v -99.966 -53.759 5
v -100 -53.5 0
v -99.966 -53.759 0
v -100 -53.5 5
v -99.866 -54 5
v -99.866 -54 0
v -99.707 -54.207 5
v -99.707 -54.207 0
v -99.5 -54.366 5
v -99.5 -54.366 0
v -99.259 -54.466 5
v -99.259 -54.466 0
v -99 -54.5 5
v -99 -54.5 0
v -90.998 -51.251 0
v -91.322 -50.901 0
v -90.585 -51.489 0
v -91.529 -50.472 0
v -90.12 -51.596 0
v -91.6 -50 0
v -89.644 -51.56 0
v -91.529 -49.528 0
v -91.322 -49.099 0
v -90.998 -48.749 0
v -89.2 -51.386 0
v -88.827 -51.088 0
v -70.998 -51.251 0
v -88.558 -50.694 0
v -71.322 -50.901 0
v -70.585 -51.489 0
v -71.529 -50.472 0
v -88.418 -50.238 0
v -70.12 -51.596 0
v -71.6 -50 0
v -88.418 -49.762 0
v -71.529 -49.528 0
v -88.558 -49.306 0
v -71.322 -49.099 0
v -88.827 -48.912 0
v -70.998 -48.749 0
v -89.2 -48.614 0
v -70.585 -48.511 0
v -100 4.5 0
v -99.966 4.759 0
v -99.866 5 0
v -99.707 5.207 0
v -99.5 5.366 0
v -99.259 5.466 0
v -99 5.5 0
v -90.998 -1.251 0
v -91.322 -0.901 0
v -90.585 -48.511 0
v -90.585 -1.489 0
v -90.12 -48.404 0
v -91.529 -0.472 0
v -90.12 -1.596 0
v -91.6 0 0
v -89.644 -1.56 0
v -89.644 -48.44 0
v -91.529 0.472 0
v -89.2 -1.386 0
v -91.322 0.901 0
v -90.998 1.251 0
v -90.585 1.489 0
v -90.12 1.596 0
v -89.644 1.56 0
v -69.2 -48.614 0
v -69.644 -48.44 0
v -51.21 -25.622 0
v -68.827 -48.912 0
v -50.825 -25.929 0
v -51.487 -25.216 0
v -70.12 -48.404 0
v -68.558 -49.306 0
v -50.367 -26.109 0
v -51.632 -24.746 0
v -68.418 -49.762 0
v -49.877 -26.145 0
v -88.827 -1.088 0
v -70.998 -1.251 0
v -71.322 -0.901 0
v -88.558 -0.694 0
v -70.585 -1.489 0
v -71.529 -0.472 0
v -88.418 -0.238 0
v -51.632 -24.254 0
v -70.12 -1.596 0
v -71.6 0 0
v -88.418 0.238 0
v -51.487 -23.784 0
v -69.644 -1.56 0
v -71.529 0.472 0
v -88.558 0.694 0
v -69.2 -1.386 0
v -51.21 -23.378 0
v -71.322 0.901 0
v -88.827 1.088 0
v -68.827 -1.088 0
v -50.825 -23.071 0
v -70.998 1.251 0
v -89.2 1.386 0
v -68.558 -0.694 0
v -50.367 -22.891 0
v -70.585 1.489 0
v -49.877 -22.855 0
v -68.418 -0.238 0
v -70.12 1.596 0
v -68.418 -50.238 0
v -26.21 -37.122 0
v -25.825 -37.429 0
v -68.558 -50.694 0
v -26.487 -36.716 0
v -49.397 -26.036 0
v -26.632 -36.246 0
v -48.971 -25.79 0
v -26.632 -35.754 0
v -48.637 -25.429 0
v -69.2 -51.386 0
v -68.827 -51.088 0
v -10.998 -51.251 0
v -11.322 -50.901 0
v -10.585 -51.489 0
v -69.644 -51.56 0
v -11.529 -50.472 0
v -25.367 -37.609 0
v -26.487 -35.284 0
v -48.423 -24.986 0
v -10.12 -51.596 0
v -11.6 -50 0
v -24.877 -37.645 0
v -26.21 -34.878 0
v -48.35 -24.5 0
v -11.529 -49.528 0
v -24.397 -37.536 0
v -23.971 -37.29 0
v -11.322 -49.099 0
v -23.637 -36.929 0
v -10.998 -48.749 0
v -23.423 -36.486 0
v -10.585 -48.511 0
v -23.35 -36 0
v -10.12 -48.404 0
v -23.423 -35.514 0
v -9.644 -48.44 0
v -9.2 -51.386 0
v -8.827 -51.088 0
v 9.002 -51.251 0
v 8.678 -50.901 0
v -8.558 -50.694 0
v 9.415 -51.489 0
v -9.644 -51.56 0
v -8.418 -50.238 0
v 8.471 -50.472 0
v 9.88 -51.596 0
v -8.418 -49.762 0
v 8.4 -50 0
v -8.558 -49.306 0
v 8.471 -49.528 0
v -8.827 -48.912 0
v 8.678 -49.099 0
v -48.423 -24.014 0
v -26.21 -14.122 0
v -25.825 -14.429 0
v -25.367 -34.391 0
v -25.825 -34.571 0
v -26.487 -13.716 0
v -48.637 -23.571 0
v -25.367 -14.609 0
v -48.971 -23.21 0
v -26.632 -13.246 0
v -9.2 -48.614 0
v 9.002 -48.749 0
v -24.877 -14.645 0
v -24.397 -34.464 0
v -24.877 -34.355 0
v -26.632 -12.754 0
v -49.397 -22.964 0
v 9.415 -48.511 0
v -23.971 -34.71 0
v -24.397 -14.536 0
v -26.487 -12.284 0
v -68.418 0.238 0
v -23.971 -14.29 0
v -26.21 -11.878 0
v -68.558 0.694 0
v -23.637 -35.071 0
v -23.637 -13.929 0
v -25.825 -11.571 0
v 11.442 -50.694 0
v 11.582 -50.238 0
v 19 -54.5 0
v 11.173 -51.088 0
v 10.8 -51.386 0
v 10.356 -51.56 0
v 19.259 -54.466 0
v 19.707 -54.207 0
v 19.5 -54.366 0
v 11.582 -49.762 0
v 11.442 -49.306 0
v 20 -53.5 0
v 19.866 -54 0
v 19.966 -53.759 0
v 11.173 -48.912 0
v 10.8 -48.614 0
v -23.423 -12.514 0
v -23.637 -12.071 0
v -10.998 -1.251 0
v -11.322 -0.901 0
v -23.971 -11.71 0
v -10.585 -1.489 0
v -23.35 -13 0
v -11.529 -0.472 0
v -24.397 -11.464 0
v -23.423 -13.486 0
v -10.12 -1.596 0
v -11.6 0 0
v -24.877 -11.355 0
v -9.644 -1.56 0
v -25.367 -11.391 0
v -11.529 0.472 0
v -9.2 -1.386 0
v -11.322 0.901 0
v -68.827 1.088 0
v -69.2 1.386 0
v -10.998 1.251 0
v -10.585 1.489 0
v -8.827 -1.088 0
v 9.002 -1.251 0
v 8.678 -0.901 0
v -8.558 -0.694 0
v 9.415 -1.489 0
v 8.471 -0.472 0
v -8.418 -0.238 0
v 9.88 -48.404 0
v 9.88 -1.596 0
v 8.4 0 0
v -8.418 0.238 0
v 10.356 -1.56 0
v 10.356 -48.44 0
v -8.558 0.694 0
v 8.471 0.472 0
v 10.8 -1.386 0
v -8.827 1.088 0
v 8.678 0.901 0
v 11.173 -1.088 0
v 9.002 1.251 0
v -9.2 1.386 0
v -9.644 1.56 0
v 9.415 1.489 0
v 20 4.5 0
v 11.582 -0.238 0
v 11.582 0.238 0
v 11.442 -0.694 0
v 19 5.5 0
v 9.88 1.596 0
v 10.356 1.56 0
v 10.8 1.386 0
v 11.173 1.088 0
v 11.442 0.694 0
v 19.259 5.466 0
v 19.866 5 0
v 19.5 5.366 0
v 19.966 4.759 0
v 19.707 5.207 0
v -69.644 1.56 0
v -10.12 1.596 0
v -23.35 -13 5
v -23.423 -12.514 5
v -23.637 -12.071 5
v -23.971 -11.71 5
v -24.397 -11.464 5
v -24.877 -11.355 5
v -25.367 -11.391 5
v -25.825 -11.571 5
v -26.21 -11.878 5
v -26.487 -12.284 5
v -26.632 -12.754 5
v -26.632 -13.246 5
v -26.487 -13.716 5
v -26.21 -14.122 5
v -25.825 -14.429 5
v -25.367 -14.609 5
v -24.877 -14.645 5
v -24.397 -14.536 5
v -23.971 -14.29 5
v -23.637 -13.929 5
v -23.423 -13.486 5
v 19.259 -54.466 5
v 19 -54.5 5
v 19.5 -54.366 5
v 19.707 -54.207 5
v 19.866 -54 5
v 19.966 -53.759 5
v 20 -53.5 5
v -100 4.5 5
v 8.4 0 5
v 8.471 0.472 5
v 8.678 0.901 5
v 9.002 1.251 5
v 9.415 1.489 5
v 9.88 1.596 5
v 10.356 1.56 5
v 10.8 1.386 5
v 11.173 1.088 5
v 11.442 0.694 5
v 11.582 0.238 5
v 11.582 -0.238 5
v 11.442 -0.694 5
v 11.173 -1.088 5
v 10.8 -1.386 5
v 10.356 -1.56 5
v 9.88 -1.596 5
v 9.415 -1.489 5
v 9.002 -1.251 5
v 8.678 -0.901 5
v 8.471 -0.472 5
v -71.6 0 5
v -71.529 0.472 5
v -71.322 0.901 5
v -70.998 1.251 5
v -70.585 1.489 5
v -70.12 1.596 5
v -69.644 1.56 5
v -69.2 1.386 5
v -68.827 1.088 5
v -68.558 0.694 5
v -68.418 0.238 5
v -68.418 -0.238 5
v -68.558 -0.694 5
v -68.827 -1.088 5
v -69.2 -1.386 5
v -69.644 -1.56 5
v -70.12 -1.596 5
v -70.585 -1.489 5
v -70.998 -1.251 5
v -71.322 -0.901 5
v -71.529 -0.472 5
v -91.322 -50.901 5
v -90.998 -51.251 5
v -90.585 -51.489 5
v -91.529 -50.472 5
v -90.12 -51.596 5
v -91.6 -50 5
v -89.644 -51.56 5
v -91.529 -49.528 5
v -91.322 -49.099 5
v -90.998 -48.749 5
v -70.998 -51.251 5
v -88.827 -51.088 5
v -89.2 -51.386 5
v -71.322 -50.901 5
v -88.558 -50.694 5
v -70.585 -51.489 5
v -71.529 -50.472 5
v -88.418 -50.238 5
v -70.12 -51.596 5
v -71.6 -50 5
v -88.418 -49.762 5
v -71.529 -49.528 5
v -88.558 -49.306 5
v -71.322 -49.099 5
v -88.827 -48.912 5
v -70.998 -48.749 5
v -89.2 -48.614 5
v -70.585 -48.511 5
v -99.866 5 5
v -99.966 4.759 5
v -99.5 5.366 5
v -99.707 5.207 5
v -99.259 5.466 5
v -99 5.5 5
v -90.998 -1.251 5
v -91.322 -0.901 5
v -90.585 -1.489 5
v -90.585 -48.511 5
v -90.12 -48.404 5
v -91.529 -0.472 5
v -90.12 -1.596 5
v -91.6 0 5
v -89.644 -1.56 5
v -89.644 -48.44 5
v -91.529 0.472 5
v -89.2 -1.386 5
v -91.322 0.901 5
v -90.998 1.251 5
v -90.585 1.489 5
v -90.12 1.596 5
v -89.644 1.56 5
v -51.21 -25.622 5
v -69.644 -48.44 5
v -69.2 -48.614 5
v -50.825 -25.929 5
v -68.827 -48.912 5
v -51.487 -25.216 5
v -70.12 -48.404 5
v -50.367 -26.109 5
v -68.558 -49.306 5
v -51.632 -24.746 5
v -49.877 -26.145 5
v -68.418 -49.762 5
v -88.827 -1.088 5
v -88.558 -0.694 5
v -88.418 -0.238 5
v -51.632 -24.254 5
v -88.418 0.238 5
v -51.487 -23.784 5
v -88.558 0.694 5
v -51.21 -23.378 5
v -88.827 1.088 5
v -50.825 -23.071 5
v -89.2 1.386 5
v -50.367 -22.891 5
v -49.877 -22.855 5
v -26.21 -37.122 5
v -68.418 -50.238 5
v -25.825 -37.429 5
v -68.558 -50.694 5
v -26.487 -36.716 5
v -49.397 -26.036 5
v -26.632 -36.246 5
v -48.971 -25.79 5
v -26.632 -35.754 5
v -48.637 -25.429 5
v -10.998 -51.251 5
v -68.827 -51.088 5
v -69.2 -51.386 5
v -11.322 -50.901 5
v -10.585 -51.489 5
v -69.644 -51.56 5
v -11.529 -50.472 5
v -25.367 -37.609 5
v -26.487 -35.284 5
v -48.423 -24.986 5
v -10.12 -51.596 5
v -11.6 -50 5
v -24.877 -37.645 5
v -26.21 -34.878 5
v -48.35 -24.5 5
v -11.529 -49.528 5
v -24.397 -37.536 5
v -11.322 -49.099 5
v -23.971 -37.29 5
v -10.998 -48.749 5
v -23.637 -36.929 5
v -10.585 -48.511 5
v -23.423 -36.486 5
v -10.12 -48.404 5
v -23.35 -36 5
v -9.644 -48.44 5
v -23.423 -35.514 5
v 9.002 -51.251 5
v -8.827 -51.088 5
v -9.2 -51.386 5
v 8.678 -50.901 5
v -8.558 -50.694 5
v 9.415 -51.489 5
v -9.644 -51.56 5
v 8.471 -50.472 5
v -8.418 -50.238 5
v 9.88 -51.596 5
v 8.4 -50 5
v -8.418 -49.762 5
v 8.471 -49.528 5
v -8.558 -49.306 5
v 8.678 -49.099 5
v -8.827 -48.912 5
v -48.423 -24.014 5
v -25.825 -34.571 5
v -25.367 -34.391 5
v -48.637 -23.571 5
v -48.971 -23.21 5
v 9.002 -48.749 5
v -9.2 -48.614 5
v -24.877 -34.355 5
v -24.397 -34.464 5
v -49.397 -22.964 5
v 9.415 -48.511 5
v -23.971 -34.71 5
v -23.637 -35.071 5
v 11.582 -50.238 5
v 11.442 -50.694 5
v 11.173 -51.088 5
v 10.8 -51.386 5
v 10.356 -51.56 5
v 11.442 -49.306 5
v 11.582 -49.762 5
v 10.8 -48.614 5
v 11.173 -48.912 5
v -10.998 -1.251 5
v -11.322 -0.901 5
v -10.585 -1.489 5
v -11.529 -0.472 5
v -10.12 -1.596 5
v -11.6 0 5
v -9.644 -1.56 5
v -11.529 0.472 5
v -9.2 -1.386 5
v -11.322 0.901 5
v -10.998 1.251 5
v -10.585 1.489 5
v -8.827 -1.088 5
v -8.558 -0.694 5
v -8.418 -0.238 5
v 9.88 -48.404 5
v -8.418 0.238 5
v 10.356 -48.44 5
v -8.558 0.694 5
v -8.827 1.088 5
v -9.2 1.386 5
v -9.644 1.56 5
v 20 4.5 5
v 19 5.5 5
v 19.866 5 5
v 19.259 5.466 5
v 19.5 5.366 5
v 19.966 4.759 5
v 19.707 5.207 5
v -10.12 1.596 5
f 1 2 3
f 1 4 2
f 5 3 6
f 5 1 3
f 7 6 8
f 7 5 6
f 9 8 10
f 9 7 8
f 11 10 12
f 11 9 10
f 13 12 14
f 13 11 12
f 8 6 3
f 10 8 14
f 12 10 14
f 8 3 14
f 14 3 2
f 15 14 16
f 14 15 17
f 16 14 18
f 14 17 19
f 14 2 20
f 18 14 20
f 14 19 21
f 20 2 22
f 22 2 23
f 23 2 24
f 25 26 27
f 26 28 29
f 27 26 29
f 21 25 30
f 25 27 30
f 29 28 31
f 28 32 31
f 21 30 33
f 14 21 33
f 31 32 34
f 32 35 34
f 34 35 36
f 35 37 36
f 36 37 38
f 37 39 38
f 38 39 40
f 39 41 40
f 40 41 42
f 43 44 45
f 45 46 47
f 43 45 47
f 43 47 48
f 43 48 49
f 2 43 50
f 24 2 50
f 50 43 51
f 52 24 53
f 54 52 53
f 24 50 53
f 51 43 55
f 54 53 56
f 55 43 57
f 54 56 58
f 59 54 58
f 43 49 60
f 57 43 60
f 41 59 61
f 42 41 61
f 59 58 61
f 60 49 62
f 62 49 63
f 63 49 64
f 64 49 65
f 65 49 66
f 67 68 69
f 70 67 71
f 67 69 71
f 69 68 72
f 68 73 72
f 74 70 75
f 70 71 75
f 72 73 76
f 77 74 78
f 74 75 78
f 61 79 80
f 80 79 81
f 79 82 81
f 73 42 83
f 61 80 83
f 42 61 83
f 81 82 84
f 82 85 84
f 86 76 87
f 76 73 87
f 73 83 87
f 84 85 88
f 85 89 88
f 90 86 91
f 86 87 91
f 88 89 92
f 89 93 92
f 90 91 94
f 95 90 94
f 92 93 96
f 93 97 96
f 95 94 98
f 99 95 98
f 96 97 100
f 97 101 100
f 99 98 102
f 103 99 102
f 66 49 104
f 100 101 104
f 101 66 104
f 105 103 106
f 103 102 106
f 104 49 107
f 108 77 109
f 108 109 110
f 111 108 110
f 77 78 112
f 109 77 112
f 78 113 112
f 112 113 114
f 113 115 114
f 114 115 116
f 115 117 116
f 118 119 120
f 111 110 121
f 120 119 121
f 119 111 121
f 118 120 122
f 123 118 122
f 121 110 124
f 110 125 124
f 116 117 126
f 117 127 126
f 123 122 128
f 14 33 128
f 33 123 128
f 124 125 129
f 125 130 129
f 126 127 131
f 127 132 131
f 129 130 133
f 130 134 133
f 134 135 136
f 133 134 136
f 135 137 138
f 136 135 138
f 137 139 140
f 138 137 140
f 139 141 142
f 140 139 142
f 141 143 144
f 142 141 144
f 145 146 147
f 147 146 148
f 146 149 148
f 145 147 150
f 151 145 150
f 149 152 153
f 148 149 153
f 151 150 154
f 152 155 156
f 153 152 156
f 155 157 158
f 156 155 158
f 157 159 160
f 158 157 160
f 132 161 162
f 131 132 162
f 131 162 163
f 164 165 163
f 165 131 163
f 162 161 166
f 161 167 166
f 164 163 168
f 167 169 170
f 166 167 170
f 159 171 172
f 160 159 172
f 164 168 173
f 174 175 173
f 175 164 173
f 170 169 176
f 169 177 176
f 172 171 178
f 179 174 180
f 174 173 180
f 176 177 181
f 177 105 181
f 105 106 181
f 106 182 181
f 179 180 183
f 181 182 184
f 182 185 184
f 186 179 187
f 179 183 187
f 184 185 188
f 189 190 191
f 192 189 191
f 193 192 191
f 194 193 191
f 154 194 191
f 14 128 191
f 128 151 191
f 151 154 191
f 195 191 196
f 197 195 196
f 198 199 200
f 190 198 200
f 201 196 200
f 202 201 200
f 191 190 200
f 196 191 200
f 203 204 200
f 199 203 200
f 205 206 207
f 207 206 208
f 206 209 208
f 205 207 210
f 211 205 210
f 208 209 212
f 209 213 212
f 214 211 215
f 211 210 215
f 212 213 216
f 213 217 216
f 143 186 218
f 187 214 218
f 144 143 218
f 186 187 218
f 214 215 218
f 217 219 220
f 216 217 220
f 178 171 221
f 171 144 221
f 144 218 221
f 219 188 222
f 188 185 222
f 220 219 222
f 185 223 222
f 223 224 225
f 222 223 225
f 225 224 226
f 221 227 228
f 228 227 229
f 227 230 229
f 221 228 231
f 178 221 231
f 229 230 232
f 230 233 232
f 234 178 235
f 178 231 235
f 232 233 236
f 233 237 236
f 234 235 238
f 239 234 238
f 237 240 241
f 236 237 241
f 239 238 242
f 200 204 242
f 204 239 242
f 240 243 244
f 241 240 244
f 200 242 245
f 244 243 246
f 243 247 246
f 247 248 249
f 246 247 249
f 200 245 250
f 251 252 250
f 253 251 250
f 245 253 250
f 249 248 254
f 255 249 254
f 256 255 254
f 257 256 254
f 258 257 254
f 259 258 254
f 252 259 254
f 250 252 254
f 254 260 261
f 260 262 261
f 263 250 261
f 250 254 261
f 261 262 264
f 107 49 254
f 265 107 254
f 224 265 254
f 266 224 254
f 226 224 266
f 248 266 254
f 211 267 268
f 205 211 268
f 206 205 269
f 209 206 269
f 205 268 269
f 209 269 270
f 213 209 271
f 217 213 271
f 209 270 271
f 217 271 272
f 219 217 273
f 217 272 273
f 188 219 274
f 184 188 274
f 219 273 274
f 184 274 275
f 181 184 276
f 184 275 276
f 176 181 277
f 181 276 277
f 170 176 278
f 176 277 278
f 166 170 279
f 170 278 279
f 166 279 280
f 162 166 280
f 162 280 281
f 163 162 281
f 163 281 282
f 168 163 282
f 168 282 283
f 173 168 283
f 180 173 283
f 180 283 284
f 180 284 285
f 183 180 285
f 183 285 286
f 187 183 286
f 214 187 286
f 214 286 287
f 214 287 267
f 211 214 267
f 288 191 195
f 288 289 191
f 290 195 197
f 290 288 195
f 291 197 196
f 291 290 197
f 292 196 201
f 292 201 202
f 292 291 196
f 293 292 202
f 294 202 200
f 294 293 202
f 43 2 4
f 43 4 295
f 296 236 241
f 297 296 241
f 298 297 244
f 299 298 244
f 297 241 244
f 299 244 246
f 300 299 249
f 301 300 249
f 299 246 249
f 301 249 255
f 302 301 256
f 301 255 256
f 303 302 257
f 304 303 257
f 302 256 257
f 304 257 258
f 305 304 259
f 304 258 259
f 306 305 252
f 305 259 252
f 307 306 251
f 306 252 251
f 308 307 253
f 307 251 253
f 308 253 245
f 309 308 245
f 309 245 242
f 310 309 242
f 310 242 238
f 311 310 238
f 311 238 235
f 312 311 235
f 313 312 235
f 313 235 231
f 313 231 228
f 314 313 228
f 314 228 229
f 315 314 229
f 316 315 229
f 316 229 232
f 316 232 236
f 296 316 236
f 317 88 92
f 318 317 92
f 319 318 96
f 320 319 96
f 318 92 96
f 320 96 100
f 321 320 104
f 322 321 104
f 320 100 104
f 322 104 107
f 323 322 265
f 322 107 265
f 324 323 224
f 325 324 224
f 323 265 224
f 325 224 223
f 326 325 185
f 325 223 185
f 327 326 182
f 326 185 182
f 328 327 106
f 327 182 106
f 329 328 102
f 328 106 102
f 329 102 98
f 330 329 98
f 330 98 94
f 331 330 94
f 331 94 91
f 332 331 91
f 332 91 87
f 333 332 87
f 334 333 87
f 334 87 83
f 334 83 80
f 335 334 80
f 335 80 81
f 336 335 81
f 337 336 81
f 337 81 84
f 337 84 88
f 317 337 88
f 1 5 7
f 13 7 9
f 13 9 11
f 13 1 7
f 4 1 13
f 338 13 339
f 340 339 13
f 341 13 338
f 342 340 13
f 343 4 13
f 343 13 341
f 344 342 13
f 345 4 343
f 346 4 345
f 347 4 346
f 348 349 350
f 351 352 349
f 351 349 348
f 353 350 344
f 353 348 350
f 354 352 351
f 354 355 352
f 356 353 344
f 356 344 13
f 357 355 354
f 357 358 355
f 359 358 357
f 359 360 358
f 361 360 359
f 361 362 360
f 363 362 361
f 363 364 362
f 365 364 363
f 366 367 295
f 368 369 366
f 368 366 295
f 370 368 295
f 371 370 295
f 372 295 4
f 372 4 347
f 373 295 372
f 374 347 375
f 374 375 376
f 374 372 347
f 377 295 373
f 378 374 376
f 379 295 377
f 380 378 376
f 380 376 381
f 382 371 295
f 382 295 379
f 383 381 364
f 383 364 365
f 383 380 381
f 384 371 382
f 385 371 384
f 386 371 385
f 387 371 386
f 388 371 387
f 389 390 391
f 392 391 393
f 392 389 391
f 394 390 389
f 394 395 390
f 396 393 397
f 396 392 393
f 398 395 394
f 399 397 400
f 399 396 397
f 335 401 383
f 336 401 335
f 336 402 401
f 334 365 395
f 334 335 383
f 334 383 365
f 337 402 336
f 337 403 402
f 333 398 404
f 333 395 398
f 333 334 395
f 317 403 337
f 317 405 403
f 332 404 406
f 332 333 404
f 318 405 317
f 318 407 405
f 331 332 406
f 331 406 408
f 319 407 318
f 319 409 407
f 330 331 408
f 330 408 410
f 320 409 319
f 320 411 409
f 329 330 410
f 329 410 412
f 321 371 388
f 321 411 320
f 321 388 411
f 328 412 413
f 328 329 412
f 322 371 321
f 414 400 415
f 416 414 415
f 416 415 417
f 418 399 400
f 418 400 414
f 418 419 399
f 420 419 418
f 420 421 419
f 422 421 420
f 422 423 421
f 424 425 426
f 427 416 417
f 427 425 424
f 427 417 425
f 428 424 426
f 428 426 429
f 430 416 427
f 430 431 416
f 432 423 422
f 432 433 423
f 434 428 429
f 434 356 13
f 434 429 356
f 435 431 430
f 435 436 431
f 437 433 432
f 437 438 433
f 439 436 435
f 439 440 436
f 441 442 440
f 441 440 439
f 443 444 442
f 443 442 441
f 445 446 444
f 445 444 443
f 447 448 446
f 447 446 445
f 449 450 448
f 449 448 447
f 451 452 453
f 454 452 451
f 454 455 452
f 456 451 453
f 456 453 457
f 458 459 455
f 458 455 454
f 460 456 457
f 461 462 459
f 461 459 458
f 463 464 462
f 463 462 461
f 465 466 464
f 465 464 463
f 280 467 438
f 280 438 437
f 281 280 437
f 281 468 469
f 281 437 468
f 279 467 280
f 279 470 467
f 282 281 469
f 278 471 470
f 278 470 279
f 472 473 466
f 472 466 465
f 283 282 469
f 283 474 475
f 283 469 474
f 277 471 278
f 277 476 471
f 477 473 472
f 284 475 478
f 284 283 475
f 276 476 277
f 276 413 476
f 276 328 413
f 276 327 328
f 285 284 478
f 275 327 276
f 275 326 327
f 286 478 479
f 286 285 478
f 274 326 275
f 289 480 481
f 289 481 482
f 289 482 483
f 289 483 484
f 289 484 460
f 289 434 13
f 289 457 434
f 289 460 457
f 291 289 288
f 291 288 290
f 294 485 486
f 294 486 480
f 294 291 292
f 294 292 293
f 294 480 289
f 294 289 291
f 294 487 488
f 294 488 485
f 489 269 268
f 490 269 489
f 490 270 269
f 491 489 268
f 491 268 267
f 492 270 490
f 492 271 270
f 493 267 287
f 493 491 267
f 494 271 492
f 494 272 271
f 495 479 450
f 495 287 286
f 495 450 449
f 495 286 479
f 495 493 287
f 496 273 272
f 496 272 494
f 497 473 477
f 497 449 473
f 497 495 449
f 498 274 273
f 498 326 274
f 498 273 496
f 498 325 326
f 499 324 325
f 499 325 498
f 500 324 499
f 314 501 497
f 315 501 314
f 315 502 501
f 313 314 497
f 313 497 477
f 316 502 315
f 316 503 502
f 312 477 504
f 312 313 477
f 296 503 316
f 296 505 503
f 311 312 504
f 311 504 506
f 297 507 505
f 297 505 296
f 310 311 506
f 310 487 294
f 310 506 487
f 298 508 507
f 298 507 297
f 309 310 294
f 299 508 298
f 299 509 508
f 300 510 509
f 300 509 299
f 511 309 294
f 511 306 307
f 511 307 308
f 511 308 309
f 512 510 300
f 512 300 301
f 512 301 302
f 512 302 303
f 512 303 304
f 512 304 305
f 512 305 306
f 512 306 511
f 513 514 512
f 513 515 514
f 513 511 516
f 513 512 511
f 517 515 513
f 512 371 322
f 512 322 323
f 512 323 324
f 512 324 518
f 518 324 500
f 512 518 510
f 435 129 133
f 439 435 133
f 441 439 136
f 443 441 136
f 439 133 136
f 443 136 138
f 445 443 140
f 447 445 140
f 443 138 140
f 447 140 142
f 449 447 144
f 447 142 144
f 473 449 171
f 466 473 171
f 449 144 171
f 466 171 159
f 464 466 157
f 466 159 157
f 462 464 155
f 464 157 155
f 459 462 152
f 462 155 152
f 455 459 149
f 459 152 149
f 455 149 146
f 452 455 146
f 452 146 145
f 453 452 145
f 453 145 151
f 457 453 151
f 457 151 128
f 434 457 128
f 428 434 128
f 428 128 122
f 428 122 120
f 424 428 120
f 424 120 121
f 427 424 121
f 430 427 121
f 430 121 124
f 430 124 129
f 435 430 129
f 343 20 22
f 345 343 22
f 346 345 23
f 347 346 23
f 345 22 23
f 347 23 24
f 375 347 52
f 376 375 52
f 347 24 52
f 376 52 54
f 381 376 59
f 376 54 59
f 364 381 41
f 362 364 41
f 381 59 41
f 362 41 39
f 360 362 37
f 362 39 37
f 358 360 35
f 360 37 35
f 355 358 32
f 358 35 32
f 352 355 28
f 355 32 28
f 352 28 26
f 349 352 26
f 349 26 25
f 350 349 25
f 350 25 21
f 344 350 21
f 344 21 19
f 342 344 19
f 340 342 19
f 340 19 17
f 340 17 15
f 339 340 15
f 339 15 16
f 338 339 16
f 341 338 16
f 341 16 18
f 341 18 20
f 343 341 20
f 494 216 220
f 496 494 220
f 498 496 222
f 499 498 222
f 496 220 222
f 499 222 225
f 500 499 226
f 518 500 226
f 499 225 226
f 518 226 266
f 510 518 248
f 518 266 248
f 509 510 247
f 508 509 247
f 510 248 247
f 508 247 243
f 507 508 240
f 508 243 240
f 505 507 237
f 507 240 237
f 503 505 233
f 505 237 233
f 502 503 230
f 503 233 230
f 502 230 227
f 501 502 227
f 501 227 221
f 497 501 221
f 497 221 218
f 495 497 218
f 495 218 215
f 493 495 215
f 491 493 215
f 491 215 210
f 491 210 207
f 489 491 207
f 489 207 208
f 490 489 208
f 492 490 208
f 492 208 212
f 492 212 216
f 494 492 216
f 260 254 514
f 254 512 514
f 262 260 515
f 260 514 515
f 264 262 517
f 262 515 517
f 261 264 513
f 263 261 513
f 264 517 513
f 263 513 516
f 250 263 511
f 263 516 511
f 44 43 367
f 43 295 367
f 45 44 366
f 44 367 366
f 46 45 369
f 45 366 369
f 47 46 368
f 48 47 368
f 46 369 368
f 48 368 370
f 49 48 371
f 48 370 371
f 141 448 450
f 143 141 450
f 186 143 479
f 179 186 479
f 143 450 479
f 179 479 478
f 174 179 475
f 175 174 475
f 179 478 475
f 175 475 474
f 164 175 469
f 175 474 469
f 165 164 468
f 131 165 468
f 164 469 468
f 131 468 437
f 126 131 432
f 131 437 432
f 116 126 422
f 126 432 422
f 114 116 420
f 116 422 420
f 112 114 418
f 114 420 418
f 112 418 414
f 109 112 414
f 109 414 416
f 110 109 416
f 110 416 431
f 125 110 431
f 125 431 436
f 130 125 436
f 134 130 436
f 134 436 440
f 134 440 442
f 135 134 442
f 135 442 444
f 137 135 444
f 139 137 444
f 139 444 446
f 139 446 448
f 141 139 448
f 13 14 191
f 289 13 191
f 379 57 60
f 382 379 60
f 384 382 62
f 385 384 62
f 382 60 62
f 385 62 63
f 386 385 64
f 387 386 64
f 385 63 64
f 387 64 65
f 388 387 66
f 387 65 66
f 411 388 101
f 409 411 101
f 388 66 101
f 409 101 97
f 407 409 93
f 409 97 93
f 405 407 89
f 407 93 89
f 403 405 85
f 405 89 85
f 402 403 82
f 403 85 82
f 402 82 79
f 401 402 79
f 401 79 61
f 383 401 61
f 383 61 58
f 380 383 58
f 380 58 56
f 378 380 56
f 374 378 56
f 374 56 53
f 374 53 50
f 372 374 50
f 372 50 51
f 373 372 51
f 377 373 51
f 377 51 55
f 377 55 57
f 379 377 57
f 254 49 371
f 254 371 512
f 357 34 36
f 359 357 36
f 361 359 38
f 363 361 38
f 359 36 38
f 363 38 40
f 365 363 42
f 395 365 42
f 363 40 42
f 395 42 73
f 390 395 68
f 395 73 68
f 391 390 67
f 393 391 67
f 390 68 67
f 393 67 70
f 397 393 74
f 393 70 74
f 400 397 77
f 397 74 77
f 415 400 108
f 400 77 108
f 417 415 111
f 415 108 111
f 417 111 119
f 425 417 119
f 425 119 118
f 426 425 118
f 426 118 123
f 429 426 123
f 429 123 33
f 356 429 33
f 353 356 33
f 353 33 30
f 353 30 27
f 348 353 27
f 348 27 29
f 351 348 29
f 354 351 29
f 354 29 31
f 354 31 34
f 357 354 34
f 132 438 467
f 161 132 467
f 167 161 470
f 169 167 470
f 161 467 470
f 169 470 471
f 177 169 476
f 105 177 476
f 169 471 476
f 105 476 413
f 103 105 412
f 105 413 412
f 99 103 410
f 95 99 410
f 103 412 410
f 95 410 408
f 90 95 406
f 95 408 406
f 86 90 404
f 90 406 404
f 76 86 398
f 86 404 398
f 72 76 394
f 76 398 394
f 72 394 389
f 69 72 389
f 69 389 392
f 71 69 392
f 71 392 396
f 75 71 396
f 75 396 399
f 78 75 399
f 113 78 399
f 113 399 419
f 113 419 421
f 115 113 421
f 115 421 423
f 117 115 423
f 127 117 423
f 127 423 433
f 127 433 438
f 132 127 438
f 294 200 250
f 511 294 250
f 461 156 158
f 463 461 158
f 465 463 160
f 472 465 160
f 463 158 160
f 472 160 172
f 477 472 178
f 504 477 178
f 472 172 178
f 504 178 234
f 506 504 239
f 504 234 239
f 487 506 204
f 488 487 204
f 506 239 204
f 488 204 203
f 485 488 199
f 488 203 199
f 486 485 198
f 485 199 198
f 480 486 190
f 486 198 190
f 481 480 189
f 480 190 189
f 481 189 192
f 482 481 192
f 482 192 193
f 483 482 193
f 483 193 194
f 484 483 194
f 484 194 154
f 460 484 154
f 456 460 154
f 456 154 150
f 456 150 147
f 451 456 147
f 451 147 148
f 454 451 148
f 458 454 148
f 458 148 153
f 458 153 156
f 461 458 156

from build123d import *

# Parameters (mm, degrees)
SKETCH_1_W          = 120
SKETCH_1_H          = 60
EXTRUDE_1_DEPTH     = 5
CUT_EXTRUDE_1_REACH = 115.997
SKETCH_2_R          = 1.65
CUT_EXTRUDE_2_REACH = 115.997
SKETCH_4_R          = 1.6
FILLET_1_R          = 1


with BuildPart() as part:
    # 草图1 → 凸台-拉伸1 (new body)
    with BuildSketch(Plane.XY):
        with Locations((-40, -24.5)):
            Rectangle(SKETCH_1_W, SKETCH_1_H)
    extrude(amount=EXTRUDE_1_DEPTH)

    # 草图2 → 切除-拉伸1 (cut, up to next)
    with BuildSketch(Plane.XY.offset(5), mode=Mode.PRIVATE) as cut_extrude_1_sk1:
        with Locations((-25, -13)):
            Circle(SKETCH_2_R)
    cut_extrude_1_tool1 = extrude(cut_extrude_1_sk1.sketch, amount=-CUT_EXTRUDE_1_REACH, mode=Mode.PRIVATE) & part.part
    # 草图2 → 切除-拉伸1 (cut, up to next)
    with BuildSketch(Plane.XY.offset(5), mode=Mode.PRIVATE) as cut_extrude_1_sk2:
        with Locations((-50, -24.5)):
            Circle(SKETCH_2_R)
    cut_extrude_1_tool2 = extrude(cut_extrude_1_sk2.sketch, amount=-CUT_EXTRUDE_1_REACH, mode=Mode.PRIVATE) & part.part
    # 草图2 → 切除-拉伸1 (cut, up to next)
    with BuildSketch(Plane.XY.offset(5), mode=Mode.PRIVATE) as cut_extrude_1_sk3:
        with Locations((-25, -36)):
            Circle(SKETCH_2_R)
    cut_extrude_1_tool3 = extrude(cut_extrude_1_sk3.sketch, amount=-CUT_EXTRUDE_1_REACH, mode=Mode.PRIVATE) & part.part
    add(cut_extrude_1_tool1.solids().sort_by_distance((-25, -13, 5))[0], mode=Mode.SUBTRACT)
    add(cut_extrude_1_tool2.solids().sort_by_distance((-50, -24.5, 5))[0], mode=Mode.SUBTRACT)
    add(cut_extrude_1_tool3.solids().sort_by_distance((-25, -36, 5))[0], mode=Mode.SUBTRACT)

    # 草图4 → 切除-拉伸2 (cut, up to next)
    with BuildSketch(Plane(origin=(0, 0, 0), x_dir=(-1, 0, 0), z_dir=(0, 0, -1)), mode=Mode.PRIVATE) as cut_extrude_2_sk1:
        with Locations((90, 0)):
            Circle(SKETCH_4_R)
    cut_extrude_2_tool1 = extrude(cut_extrude_2_sk1.sketch, amount=-CUT_EXTRUDE_2_REACH, mode=Mode.PRIVATE) & part.part
    # 草图4 → 切除-拉伸2 (cut, up to next)
    with BuildSketch(Plane(origin=(0, 0, 0), x_dir=(-1, 0, 0), z_dir=(0, 0, -1)), mode=Mode.PRIVATE) as cut_extrude_2_sk2:
        with Locations((70, 0)):
            Circle(SKETCH_4_R)
    cut_extrude_2_tool2 = extrude(cut_extrude_2_sk2.sketch, amount=-CUT_EXTRUDE_2_REACH, mode=Mode.PRIVATE) & part.part
    # 草图4 → 切除-拉伸2 (cut, up to next)
    with BuildSketch(Plane(origin=(0, 0, 0), x_dir=(-1, 0, 0), z_dir=(0, 0, -1)), mode=Mode.PRIVATE) as cut_extrude_2_sk3:
        with Locations((70, -50)):
            Circle(SKETCH_4_R)
    cut_extrude_2_tool3 = extrude(cut_extrude_2_sk3.sketch, amount=-CUT_EXTRUDE_2_REACH, mode=Mode.PRIVATE) & part.part
    # 草图4 → 切除-拉伸2 (cut, up to next)
    with BuildSketch(Plane(origin=(0, 0, 0), x_dir=(-1, 0, 0), z_dir=(0, 0, -1)), mode=Mode.PRIVATE) as cut_extrude_2_sk4:
        with Locations((90, -50)):
            Circle(SKETCH_4_R)
    cut_extrude_2_tool4 = extrude(cut_extrude_2_sk4.sketch, amount=-CUT_EXTRUDE_2_REACH, mode=Mode.PRIVATE) & part.part
    # 草图4 → 切除-拉伸2 (cut, up to next)
    with BuildSketch(Plane(origin=(0, 0, 0), x_dir=(-1, 0, 0), z_dir=(0, 0, -1)), mode=Mode.PRIVATE) as cut_extrude_2_sk5:
        with Locations((10, -50)):
            Circle(SKETCH_4_R)
    cut_extrude_2_tool5 = extrude(cut_extrude_2_sk5.sketch, amount=-CUT_EXTRUDE_2_REACH, mode=Mode.PRIVATE) & part.part
    # 草图4 → 切除-拉伸2 (cut, up to next)
    with BuildSketch(Plane(origin=(0, 0, 0), x_dir=(-1, 0, 0), z_dir=(0, 0, -1)), mode=Mode.PRIVATE) as cut_extrude_2_sk6:
        with Locations((-10, -50)):
            Circle(SKETCH_4_R)
    cut_extrude_2_tool6 = extrude(cut_extrude_2_sk6.sketch, amount=-CUT_EXTRUDE_2_REACH, mode=Mode.PRIVATE) & part.part
    # 草图4 → 切除-拉伸2 (cut, up to next)
    with BuildSketch(Plane(origin=(0, 0, 0), x_dir=(-1, 0, 0), z_dir=(0, 0, -1)), mode=Mode.PRIVATE) as cut_extrude_2_sk7:
        with Locations((-10, 0)):
            Circle(SKETCH_4_R)
    cut_extrude_2_tool7 = extrude(cut_extrude_2_sk7.sketch, amount=-CUT_EXTRUDE_2_REACH, mode=Mode.PRIVATE) & part.part
    # 草图4 → 切除-拉伸2 (cut, up to next)
    with BuildSketch(Plane(origin=(0, 0, 0), x_dir=(-1, 0, 0), z_dir=(0, 0, -1)), mode=Mode.PRIVATE) as cut_extrude_2_sk8:
        with Locations((10, 0)):
            Circle(SKETCH_4_R)
    cut_extrude_2_tool8 = extrude(cut_extrude_2_sk8.sketch, amount=-CUT_EXTRUDE_2_REACH, mode=Mode.PRIVATE) & part.part
    add(cut_extrude_2_tool1.solids().sort_by_distance((-90, 0, 0))[0], mode=Mode.SUBTRACT)
    add(cut_extrude_2_tool2.solids().sort_by_distance((-70, 0, 0))[0], mode=Mode.SUBTRACT)
    add(cut_extrude_2_tool3.solids().sort_by_distance((-70, -50, 0))[0], mode=Mode.SUBTRACT)
    add(cut_extrude_2_tool4.solids().sort_by_distance((-90, -50, 0))[0], mode=Mode.SUBTRACT)
    add(cut_extrude_2_tool5.solids().sort_by_distance((-10, -50, 0))[0], mode=Mode.SUBTRACT)
    add(cut_extrude_2_tool6.solids().sort_by_distance((10, -50, 0))[0], mode=Mode.SUBTRACT)
    add(cut_extrude_2_tool7.solids().sort_by_distance((10, 0, 0))[0], mode=Mode.SUBTRACT)
    add(cut_extrude_2_tool8.solids().sort_by_distance((-10, 0, 0))[0], mode=Mode.SUBTRACT)

    # 圆角1
    fillet_1_edges = [part.edges().sort_by_distance(p)[0] for p in [
        (20, -54.5, 2.5),
        (-100, -54.5, 2.5),
        (-100, 5.5, 2.5),
        (20, 5.5, 2.5),
    ]]
    fillet(fillet_1_edges, radius=FILLET_1_R)


solid = part.part
